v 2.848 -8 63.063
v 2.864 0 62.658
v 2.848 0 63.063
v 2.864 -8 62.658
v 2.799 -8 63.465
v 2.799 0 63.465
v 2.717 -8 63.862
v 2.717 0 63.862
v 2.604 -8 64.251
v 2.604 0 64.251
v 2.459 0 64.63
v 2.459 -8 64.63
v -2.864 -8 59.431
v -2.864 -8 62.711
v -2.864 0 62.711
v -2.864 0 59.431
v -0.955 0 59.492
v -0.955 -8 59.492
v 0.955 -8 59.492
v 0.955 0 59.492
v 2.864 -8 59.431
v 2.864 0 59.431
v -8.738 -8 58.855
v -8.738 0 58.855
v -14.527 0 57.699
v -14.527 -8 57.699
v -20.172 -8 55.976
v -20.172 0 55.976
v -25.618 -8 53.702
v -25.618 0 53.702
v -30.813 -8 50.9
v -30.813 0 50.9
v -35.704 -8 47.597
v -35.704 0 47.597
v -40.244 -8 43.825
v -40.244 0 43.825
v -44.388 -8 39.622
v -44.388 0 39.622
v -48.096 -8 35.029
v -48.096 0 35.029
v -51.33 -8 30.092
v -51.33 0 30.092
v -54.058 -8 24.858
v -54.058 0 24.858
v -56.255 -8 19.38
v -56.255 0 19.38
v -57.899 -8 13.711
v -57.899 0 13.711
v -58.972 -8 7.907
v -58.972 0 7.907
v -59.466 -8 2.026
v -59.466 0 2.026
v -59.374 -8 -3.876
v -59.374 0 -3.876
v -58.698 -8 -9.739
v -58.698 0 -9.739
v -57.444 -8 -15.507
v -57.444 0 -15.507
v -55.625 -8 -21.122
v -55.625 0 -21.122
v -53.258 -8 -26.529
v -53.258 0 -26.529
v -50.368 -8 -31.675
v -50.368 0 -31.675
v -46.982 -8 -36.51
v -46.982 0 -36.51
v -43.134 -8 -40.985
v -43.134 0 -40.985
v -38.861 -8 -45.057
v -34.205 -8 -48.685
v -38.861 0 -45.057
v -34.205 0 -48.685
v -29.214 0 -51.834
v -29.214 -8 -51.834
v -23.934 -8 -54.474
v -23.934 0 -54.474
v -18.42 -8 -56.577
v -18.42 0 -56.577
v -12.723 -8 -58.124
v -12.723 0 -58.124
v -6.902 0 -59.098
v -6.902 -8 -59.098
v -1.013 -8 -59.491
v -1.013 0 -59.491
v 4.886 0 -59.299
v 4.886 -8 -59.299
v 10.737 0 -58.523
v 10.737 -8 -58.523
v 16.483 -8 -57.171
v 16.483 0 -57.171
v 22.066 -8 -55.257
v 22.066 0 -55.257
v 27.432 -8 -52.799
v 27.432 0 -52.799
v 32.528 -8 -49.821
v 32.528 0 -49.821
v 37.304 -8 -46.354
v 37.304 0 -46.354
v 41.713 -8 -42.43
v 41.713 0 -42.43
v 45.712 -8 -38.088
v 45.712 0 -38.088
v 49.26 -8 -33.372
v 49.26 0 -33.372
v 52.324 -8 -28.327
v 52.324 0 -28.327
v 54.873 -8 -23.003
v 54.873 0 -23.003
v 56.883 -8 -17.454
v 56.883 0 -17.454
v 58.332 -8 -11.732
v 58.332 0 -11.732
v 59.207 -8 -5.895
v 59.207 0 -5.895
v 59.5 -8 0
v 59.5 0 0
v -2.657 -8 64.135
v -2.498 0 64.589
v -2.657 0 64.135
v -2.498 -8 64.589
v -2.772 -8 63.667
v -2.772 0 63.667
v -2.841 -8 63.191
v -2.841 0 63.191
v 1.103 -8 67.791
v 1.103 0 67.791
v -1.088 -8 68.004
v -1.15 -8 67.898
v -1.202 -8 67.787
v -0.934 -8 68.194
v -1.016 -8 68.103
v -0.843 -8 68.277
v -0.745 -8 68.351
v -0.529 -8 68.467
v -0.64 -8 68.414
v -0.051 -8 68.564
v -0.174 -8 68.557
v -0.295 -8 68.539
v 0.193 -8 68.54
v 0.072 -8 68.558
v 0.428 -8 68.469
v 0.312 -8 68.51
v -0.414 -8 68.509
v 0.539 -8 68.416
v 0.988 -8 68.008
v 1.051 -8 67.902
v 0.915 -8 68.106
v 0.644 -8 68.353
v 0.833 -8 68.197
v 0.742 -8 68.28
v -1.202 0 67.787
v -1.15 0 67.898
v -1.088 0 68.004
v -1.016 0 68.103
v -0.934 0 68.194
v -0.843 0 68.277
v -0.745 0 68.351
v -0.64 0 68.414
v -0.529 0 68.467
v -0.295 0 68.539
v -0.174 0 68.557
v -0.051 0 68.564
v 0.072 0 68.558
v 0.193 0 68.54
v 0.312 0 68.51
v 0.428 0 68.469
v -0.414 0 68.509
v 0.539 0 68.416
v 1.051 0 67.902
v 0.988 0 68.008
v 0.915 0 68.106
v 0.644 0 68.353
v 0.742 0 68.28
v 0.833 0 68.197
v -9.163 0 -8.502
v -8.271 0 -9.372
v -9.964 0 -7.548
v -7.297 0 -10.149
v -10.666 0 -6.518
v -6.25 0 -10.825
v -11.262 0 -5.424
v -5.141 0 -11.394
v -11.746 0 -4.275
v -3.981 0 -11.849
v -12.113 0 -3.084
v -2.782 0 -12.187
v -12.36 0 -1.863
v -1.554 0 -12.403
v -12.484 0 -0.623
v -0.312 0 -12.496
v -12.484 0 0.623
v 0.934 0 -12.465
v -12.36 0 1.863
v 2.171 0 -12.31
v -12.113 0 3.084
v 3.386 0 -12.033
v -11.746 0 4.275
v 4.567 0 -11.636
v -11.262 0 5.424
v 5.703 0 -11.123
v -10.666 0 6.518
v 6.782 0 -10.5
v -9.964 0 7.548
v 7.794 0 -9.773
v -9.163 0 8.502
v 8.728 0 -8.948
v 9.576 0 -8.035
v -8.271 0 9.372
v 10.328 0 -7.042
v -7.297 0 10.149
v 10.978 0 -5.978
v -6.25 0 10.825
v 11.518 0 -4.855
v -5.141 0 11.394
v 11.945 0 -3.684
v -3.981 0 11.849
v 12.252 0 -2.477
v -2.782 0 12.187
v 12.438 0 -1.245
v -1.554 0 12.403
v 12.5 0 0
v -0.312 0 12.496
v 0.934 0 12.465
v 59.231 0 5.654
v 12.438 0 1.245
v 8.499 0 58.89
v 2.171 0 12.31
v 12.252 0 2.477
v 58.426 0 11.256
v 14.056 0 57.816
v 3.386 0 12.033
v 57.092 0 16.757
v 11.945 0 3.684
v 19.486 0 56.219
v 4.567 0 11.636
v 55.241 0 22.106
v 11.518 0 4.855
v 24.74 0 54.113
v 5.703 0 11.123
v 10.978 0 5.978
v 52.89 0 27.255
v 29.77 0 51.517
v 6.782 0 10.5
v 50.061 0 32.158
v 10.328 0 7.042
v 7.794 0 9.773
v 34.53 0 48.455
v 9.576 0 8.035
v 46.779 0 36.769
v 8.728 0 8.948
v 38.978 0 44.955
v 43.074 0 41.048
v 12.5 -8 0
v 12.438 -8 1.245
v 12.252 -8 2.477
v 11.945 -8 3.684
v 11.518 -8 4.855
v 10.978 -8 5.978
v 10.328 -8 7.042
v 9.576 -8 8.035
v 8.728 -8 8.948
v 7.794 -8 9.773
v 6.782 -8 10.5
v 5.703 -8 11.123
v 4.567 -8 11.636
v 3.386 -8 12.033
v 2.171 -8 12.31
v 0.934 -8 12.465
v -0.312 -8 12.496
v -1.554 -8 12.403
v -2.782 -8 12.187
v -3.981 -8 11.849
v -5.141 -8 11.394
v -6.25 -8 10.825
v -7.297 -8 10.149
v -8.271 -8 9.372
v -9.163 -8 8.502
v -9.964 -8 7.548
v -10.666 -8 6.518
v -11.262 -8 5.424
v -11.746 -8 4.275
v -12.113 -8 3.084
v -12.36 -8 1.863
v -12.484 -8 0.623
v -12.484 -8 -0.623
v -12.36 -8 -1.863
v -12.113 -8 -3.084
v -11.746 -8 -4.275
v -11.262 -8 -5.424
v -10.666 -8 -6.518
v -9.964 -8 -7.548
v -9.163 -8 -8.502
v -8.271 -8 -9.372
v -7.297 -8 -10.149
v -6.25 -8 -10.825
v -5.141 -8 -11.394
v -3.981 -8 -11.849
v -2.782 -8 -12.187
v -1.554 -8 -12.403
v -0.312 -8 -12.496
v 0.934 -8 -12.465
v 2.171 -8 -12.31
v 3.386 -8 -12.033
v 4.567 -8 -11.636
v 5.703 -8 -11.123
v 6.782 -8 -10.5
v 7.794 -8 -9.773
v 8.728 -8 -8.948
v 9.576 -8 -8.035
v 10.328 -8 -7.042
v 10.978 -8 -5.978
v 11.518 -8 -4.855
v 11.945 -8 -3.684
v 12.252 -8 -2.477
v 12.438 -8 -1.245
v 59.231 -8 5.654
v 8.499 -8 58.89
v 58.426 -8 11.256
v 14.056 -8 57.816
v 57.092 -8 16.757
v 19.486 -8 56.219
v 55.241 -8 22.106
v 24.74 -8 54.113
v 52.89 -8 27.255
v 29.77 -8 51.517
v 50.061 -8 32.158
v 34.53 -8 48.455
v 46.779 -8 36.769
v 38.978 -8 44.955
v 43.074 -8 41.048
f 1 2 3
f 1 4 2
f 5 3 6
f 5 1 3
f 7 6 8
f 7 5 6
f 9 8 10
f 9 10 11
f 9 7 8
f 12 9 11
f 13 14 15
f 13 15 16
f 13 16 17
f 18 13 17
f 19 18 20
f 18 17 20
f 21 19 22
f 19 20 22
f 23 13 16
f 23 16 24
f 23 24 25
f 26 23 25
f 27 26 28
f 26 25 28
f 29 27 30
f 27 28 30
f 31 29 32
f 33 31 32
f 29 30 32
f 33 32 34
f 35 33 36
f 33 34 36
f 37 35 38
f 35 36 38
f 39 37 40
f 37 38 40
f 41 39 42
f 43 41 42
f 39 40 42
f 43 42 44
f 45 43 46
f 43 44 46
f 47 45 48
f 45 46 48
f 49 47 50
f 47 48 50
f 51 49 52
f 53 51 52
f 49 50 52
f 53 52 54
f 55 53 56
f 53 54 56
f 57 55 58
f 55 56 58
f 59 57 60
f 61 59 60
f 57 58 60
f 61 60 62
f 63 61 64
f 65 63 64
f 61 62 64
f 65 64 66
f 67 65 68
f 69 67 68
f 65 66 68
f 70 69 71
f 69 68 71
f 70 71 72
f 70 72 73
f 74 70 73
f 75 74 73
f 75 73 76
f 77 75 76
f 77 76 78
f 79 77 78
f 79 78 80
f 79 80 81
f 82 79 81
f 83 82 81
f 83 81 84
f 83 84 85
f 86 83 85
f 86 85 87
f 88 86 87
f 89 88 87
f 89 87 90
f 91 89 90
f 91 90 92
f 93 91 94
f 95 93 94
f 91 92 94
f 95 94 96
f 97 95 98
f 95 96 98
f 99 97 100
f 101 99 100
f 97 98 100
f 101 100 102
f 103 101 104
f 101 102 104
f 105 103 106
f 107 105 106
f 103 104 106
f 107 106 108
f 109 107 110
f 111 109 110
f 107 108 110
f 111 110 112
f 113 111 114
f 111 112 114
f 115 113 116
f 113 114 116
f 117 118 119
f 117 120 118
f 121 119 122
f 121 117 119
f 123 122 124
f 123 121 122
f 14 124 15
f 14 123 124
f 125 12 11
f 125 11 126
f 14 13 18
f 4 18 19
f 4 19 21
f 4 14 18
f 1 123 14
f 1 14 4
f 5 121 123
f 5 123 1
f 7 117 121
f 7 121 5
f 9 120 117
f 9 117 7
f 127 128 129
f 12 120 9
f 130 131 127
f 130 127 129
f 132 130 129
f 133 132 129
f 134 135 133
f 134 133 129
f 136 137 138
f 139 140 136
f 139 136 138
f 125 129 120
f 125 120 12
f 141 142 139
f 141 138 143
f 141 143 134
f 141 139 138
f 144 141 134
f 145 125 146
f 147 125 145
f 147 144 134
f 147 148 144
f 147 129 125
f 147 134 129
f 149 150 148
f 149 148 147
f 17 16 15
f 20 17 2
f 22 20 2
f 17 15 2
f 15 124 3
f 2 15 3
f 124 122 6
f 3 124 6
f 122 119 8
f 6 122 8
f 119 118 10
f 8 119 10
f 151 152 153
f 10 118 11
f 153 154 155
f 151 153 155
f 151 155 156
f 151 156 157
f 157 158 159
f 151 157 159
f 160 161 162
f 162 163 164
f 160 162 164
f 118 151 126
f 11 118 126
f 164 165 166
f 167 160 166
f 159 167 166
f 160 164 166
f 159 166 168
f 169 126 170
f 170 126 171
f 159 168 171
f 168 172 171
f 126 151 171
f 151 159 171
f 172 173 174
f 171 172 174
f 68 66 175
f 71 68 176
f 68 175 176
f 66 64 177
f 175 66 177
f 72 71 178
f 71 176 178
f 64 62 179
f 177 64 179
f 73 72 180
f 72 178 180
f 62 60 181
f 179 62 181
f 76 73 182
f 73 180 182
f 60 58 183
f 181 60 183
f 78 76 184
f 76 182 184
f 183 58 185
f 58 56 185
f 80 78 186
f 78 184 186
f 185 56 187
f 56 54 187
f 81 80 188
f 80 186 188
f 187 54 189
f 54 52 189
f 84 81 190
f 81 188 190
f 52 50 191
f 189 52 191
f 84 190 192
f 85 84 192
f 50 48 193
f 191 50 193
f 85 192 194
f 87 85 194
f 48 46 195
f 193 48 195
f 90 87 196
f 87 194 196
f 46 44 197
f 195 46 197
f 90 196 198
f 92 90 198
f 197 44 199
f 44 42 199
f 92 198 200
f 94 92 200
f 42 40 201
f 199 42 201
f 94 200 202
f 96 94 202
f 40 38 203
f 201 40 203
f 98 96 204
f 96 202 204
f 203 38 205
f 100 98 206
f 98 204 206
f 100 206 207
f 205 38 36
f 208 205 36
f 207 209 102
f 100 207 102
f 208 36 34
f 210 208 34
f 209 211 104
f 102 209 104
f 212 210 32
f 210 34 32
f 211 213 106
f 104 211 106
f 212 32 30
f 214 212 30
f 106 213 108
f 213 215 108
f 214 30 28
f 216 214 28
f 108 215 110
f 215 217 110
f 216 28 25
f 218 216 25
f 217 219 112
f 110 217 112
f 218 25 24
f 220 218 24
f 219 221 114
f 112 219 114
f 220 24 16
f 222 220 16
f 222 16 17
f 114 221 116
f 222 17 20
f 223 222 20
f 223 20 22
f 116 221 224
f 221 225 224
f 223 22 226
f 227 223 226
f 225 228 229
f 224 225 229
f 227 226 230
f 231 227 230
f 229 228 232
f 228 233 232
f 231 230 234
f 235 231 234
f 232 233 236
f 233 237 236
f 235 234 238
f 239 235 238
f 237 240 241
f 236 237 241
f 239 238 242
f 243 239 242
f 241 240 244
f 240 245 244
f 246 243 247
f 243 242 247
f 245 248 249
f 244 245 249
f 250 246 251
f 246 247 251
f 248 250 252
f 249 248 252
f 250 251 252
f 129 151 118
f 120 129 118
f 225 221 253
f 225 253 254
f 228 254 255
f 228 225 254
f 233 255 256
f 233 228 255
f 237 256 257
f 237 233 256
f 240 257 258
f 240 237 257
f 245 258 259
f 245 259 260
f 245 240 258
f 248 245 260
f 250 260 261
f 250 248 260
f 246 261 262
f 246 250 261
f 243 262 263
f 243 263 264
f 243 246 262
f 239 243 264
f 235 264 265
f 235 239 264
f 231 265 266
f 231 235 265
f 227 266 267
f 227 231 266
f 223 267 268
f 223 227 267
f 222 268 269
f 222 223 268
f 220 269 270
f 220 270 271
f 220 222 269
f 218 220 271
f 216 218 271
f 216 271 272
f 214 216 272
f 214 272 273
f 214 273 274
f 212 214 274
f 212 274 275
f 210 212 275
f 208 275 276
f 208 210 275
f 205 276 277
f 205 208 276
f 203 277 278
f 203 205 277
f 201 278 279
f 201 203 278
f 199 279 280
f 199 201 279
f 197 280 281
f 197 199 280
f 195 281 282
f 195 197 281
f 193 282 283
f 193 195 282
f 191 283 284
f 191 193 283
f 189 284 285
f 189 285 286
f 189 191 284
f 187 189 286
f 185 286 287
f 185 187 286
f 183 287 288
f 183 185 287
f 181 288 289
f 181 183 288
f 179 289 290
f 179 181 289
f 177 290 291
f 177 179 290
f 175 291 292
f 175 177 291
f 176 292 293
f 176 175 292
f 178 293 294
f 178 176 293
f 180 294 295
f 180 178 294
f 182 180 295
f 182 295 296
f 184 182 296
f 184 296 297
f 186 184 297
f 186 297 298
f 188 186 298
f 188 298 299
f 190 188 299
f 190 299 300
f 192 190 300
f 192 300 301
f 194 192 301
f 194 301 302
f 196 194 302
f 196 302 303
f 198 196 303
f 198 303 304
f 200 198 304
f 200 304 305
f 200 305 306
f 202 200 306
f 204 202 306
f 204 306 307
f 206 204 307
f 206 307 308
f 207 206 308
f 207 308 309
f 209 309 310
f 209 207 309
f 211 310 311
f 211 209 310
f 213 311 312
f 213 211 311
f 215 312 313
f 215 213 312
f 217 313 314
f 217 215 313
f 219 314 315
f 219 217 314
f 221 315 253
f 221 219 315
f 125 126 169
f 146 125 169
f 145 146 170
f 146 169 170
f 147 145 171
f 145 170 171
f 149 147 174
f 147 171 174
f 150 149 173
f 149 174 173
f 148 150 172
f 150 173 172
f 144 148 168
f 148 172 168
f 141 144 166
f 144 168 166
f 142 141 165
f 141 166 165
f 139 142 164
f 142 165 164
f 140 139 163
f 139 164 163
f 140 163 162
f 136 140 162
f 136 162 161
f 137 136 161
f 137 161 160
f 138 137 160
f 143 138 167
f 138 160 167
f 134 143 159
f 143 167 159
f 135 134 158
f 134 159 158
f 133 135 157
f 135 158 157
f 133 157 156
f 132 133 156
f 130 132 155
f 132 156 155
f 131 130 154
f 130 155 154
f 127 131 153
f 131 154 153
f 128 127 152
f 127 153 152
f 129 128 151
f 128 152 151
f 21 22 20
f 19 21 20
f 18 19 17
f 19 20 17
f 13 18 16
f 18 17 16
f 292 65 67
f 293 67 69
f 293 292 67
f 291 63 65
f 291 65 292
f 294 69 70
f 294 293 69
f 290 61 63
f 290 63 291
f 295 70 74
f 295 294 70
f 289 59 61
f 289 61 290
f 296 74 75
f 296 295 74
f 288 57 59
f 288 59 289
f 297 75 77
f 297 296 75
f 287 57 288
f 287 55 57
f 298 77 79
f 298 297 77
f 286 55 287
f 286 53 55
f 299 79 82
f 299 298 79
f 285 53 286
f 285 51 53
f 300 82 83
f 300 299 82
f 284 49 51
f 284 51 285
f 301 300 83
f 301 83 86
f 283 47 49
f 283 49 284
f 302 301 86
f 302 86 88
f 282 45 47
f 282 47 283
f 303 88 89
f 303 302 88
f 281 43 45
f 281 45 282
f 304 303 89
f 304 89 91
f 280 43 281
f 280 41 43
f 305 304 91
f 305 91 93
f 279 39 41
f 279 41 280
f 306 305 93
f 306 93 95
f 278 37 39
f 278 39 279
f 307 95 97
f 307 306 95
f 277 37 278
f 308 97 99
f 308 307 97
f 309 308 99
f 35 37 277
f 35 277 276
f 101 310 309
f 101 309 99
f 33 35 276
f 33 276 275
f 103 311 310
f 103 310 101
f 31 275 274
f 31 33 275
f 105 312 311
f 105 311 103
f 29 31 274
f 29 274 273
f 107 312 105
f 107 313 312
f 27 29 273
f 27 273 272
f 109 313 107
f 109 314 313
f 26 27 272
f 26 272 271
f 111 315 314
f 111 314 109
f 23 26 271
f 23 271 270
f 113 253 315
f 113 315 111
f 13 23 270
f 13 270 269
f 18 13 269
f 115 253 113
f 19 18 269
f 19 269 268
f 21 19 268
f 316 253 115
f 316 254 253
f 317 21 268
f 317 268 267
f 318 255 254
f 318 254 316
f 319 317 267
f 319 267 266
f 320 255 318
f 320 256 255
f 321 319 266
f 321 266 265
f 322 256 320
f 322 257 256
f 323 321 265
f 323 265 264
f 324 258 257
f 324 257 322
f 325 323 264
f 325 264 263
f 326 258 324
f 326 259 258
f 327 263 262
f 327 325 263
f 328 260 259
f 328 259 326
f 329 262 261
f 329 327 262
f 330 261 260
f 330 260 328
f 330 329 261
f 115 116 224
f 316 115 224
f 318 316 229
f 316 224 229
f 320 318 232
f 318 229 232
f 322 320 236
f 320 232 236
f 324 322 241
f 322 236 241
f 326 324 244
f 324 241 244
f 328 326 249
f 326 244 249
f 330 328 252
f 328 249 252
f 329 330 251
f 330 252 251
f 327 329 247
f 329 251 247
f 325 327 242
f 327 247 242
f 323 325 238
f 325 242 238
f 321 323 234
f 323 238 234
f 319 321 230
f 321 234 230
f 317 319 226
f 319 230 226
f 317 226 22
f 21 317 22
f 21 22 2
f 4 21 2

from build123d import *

# Parameters (mm, degrees)
F0_R     = 12.5
F1_DEPTH = 8
F2_DEPTH = 8
F3_R     = 5


with BuildPart() as f1:
    # F0 (on Front) → F1 (new body)
    with BuildSketch(Plane.XZ):
        with BuildLine():
            ThreePointArc((-2.864354, 59.431014), (-41.047661, -43.073653), (59.5, 0))
            ThreePointArc((59.5, 0), (43.073653, 41.047661), (2.864354, 59.431014))
            ThreePointArc((2.864354, 59.431014), (0, 59.5), (-2.864354, 59.431014))
        make_face()
        Circle(F0_R, mode=Mode.SUBTRACT)
    extrude(amount=F1_DEPTH)


with BuildPart() as f2:
    # F0 (on Front) → F2 (new body, through all)
    with BuildSketch(Plane.XZ):
        with BuildLine():
            ThreePointArc((-2.864354, 59.431014), (0, 59.5), (2.864354, 59.431014))
            Line((2.864354, 59.431014), (2.864354, 63.685618))
            Line((2.864354, 63.685618), (1.102912, 67.791029))
            ThreePointArc((1.102912, 67.791029), (-0.051035, 68.563614), (-1.202012, 67.78661))
            Line((-1.202012, 67.78661), (-2.864354, 63.685496))
            Line((-2.864354, 63.685496), (-2.864354, 59.431014))
        make_face()
    extrude(amount=F2_DEPTH)

    # F3
    f3_edges = [f2.edges().sort_by_distance(p)[0] for p in [
        (2.864354, -4, 63.685618),
        (-2.864354, -4, 63.685496),
    ]]
    fillet(f3_edges, radius=F3_R)


solid = Compound([f1.part, f2.part])
